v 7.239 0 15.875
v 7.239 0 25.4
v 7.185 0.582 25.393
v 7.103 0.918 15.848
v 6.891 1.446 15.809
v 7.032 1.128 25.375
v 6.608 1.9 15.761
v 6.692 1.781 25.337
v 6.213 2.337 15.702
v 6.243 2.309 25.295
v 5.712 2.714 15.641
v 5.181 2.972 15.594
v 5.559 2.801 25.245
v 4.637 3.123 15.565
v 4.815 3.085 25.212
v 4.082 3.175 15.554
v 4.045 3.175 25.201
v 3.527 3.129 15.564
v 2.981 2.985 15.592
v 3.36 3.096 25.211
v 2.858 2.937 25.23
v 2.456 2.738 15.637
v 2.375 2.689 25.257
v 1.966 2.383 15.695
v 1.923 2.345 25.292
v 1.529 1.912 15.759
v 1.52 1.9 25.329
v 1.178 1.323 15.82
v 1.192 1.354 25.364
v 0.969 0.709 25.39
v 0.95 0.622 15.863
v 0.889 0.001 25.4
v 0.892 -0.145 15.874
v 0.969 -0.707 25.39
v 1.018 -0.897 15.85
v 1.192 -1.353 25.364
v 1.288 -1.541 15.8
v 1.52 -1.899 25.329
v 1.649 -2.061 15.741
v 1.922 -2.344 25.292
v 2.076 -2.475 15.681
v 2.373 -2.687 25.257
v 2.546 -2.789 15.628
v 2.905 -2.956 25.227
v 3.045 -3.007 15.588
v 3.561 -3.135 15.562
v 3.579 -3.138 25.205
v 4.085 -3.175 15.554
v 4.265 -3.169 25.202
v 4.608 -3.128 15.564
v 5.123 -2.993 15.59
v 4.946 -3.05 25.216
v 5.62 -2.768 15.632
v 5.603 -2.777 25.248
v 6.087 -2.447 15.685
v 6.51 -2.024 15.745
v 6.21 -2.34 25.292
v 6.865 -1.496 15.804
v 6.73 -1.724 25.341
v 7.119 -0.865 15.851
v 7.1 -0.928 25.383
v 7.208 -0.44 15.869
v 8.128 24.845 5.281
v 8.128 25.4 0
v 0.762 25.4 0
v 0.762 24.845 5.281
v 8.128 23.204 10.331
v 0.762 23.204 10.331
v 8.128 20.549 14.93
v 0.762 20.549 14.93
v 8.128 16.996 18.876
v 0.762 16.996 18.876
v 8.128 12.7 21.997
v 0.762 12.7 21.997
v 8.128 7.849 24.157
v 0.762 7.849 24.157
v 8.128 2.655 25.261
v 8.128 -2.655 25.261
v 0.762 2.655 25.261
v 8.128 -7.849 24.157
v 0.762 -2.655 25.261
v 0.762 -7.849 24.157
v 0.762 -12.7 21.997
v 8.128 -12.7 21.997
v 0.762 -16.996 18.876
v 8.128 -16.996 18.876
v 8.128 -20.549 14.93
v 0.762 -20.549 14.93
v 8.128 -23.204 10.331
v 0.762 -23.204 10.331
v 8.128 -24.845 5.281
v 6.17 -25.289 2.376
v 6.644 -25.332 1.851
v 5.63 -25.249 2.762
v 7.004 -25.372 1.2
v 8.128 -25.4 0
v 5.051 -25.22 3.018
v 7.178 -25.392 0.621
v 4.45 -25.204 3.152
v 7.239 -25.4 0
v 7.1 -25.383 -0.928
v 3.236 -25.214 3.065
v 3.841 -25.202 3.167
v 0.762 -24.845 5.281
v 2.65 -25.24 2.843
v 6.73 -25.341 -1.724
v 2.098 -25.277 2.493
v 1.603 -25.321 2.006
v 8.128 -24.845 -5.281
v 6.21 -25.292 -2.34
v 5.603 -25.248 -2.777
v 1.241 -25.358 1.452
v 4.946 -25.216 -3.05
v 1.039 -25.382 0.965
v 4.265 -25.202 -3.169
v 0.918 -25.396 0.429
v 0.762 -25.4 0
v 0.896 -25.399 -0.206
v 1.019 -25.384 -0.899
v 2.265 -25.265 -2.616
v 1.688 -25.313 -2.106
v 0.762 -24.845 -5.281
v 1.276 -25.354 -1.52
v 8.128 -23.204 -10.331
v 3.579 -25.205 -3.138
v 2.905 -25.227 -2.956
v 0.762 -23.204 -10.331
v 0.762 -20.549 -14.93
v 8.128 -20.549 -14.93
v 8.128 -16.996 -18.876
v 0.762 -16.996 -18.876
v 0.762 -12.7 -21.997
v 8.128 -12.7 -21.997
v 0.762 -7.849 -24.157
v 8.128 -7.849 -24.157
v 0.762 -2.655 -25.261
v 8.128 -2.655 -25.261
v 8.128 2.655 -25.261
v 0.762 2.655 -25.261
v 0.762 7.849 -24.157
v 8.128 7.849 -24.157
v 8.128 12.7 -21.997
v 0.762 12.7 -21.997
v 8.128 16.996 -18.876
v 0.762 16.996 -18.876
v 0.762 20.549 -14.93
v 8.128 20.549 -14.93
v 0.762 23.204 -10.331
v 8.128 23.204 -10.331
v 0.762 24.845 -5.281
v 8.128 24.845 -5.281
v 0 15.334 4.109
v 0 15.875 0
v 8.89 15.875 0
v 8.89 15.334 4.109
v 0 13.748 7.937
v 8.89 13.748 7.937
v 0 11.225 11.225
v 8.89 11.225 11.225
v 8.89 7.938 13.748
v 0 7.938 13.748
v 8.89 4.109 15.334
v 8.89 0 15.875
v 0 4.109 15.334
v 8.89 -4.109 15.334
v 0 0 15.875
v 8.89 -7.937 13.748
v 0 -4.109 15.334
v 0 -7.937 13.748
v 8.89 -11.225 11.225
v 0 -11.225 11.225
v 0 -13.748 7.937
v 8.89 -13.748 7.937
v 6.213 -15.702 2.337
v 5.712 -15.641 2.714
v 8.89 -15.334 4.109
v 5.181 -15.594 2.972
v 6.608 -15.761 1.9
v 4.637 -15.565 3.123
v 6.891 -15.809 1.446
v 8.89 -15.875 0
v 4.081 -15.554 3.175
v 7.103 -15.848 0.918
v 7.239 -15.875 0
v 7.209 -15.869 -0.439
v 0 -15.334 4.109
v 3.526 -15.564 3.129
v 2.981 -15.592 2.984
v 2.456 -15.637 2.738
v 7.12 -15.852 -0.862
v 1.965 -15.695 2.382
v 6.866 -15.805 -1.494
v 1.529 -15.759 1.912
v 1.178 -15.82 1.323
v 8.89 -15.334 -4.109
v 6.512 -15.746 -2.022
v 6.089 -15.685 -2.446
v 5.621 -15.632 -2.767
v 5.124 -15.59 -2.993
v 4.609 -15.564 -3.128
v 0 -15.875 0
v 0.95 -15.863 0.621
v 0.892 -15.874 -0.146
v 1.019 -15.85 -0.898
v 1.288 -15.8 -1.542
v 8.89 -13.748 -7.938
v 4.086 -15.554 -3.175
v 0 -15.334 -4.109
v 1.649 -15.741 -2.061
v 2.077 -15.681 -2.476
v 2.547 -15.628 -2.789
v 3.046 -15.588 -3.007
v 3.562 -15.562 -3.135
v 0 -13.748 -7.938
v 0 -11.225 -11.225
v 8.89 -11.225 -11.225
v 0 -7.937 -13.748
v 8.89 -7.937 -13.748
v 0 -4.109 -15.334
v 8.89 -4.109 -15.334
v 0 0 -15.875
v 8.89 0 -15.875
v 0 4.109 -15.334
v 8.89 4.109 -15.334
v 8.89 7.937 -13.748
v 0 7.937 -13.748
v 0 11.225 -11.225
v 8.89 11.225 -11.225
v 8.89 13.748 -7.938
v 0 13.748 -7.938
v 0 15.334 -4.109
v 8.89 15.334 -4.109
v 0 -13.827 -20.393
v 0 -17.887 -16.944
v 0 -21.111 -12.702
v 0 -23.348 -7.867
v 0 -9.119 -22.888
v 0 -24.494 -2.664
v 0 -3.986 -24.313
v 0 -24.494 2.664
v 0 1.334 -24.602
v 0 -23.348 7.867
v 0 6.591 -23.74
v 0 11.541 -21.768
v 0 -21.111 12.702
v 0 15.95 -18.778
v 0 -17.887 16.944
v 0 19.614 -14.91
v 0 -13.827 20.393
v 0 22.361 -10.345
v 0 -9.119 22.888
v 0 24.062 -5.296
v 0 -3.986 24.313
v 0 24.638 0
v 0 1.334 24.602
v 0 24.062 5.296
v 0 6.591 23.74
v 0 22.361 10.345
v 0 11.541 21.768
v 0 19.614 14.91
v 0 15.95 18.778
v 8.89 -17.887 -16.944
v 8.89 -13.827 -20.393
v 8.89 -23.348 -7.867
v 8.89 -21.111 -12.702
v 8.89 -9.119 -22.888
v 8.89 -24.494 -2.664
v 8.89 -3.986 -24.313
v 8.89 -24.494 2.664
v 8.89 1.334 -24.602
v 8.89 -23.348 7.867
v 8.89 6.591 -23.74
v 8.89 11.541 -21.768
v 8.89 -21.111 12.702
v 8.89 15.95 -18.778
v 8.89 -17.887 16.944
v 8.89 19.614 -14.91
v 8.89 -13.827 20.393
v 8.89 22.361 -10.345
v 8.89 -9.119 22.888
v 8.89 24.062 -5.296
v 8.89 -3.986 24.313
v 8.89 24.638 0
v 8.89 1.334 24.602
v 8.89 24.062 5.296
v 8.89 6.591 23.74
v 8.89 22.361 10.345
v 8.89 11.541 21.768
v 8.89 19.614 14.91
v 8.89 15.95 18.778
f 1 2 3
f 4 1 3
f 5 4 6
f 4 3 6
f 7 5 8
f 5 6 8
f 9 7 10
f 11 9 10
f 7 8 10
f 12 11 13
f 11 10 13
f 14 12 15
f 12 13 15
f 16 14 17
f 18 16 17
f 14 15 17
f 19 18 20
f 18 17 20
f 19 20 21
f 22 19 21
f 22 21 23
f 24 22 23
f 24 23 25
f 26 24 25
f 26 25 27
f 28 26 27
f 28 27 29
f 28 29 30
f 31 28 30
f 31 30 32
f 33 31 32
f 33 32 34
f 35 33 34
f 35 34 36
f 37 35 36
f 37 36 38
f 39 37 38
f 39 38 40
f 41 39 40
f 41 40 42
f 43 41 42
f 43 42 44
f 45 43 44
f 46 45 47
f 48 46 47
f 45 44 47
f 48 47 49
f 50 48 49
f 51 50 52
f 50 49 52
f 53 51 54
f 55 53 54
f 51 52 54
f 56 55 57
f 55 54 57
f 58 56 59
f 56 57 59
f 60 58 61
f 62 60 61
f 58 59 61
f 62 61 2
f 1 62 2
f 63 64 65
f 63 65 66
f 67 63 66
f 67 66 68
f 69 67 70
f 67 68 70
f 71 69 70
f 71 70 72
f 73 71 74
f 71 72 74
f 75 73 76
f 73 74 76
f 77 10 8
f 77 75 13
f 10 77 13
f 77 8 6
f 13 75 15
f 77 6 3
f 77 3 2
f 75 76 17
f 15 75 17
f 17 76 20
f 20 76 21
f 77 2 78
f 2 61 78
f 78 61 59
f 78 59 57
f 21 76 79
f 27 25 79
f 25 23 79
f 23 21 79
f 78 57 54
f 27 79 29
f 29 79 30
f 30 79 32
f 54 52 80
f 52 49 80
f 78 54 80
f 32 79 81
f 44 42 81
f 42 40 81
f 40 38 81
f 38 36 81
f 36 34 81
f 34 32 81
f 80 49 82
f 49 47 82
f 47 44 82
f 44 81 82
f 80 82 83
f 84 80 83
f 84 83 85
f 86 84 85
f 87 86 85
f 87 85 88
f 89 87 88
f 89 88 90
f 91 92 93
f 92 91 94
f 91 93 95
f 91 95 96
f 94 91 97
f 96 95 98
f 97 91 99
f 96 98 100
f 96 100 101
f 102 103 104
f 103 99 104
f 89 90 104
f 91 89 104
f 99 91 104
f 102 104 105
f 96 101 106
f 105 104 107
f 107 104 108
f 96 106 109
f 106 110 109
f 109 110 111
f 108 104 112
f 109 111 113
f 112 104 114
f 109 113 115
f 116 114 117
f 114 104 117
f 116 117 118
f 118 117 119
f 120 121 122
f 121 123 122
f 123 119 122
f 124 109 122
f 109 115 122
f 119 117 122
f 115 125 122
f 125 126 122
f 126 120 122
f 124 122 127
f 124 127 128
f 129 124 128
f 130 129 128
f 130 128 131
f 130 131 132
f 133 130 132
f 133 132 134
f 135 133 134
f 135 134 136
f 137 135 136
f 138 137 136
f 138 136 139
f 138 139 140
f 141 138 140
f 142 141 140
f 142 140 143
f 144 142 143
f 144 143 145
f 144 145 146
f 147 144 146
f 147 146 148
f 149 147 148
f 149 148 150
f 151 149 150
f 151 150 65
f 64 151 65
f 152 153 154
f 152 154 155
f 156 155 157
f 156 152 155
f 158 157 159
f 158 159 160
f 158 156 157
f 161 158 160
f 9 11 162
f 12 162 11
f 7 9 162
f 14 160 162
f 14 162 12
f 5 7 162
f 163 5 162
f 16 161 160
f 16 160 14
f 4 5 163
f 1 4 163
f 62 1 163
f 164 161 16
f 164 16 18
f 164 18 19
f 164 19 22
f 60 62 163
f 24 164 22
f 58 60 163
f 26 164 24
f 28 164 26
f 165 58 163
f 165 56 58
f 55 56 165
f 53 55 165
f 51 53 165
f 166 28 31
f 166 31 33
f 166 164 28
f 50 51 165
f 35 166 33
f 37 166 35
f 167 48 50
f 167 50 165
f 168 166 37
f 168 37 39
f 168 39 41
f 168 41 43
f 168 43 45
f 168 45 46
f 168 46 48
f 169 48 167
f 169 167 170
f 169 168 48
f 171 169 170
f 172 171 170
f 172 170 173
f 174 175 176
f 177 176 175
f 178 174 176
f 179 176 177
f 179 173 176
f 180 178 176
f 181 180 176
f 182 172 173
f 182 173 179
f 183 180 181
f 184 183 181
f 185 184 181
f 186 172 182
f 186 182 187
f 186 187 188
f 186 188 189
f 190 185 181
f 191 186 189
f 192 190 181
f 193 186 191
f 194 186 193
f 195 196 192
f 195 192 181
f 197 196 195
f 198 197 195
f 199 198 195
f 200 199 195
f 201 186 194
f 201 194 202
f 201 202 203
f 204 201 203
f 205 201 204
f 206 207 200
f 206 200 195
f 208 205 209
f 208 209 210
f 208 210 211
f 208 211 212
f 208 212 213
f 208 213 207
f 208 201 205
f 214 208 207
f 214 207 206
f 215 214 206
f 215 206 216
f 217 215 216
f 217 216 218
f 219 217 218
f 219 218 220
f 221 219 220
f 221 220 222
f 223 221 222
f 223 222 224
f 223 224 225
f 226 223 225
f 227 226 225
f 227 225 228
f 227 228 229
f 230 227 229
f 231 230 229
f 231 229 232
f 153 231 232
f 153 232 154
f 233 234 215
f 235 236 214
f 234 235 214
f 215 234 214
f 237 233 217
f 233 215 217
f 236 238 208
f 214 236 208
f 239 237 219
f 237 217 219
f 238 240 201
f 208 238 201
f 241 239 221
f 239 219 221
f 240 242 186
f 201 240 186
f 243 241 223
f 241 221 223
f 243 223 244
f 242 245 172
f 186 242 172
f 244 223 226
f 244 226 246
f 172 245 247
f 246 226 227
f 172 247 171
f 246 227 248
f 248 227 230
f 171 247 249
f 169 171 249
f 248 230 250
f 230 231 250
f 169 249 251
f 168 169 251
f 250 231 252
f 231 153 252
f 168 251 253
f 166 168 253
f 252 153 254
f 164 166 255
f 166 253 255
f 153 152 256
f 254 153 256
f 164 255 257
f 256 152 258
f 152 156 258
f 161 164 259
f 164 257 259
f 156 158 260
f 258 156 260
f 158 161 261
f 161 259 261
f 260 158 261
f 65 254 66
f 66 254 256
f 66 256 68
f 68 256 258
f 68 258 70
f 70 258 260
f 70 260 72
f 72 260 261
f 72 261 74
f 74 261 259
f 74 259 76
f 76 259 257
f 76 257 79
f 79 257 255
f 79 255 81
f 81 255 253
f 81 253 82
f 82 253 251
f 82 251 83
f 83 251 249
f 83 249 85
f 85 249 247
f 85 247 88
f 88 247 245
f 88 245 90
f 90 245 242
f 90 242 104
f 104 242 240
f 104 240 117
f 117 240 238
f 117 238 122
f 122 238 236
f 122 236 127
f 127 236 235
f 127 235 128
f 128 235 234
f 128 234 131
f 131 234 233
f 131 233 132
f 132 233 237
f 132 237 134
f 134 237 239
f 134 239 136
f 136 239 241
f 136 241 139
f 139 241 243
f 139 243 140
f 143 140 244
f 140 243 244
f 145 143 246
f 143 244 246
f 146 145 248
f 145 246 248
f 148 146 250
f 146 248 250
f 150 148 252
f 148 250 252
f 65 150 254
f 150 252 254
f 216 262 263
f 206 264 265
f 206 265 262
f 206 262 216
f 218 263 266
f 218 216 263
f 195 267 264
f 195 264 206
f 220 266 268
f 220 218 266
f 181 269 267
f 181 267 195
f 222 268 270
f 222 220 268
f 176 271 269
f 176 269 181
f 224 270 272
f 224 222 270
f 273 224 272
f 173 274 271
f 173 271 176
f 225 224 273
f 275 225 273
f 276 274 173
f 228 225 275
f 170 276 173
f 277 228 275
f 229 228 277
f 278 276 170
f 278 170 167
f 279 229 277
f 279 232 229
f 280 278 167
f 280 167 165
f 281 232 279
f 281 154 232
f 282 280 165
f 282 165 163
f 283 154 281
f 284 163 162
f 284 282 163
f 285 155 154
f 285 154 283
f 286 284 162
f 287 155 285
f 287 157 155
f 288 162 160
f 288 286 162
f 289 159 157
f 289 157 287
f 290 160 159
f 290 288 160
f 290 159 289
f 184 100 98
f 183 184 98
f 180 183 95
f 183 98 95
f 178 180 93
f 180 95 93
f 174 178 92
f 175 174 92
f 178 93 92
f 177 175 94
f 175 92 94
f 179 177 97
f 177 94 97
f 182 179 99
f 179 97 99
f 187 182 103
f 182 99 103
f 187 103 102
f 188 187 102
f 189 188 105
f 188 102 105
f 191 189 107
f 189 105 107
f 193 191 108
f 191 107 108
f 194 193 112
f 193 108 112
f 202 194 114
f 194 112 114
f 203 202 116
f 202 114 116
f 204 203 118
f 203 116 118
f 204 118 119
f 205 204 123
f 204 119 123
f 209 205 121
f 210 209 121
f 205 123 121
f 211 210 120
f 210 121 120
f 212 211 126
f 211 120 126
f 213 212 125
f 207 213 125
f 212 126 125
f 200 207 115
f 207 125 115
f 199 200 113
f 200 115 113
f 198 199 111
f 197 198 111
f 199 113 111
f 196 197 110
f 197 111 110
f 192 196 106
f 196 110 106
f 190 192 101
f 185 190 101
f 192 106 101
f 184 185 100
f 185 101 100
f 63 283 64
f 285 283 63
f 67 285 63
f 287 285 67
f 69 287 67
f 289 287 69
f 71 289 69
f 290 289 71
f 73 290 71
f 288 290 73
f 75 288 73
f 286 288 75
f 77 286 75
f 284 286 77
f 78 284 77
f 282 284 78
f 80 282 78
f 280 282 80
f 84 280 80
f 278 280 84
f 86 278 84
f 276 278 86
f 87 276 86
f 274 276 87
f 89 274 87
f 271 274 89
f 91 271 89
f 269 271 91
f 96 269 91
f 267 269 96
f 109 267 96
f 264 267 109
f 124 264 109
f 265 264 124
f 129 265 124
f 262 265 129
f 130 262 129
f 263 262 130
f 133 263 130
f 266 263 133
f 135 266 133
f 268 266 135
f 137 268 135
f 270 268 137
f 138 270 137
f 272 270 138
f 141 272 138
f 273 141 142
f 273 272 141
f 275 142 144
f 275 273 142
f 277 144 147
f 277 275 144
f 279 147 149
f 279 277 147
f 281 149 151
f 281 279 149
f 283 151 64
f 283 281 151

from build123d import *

# Parameters (mm, degrees)
F0_R     = 25.4
F0_R_2   = 15.875
F1_DEPTH = 8.89
F3_R     = 3.175
F4_REACH = 59.7812561211
F6_R     = 3.175
F7_REACH = 59.7812562211
F8_SIZE  = 0.762
F9_SIZE  = 0.762


with BuildPart() as f1:
    # F0 (on Right) → F1 (new body)
    with BuildSketch(Plane.YZ):
        Circle(F0_R)
        Circle(F0_R_2, mode=Mode.SUBTRACT)
    extrude(amount=F1_DEPTH)

    f4_end = f1.faces().sort_by_distance((4.445, -15.875, 0))[0]
    # F3 (on offset) → F4 (cut, up to a face of the model that its end follows)
    with BuildSketch(Plane.XZ.offset(25.4)):
        with Locations((4.064, 0)):
            Circle(F3_R)
    f4_long = extrude(amount=-F4_REACH, mode=Mode.PRIVATE)
    add(split(f4_long, bisect_by=f4_end, keep=Keep.ALL, mode=Mode.PRIVATE).solids().sort_by_distance((4.064, -25.4, 0))[0], mode=Mode.SUBTRACT)

    f7_end = f1.faces().sort_by_distance((0.457728864, -15.875, 0))[0]
    # F6 (on offset) → F7 (cut, up to a face of the model that its end follows)
    with BuildSketch(Plane.XY.offset(25.4)):
        with Locations((4.064, 0)):
            Circle(F6_R)
    f7_long = extrude(amount=-F7_REACH, mode=Mode.PRIVATE)
    add(split(f7_long, bisect_by=f7_end, keep=Keep.ALL, mode=Mode.PRIVATE).solids().sort_by_distance((4.064, 0, 25.4))[0], mode=Mode.SUBTRACT)

    # F8
    f8_edges = [f1.edges().sort_by_distance(p)[0] for p in [
        (0, -25.4, 0),
    ]]
    chamfer(f8_edges, length=F8_SIZE)

    # F9
    f9_edges = [f1.edges().sort_by_distance(p)[0] for p in [
        (8.89, -25.4, 0),
    ]]
    chamfer(f9_edges, length=F9_SIZE)


solid = f1.part
